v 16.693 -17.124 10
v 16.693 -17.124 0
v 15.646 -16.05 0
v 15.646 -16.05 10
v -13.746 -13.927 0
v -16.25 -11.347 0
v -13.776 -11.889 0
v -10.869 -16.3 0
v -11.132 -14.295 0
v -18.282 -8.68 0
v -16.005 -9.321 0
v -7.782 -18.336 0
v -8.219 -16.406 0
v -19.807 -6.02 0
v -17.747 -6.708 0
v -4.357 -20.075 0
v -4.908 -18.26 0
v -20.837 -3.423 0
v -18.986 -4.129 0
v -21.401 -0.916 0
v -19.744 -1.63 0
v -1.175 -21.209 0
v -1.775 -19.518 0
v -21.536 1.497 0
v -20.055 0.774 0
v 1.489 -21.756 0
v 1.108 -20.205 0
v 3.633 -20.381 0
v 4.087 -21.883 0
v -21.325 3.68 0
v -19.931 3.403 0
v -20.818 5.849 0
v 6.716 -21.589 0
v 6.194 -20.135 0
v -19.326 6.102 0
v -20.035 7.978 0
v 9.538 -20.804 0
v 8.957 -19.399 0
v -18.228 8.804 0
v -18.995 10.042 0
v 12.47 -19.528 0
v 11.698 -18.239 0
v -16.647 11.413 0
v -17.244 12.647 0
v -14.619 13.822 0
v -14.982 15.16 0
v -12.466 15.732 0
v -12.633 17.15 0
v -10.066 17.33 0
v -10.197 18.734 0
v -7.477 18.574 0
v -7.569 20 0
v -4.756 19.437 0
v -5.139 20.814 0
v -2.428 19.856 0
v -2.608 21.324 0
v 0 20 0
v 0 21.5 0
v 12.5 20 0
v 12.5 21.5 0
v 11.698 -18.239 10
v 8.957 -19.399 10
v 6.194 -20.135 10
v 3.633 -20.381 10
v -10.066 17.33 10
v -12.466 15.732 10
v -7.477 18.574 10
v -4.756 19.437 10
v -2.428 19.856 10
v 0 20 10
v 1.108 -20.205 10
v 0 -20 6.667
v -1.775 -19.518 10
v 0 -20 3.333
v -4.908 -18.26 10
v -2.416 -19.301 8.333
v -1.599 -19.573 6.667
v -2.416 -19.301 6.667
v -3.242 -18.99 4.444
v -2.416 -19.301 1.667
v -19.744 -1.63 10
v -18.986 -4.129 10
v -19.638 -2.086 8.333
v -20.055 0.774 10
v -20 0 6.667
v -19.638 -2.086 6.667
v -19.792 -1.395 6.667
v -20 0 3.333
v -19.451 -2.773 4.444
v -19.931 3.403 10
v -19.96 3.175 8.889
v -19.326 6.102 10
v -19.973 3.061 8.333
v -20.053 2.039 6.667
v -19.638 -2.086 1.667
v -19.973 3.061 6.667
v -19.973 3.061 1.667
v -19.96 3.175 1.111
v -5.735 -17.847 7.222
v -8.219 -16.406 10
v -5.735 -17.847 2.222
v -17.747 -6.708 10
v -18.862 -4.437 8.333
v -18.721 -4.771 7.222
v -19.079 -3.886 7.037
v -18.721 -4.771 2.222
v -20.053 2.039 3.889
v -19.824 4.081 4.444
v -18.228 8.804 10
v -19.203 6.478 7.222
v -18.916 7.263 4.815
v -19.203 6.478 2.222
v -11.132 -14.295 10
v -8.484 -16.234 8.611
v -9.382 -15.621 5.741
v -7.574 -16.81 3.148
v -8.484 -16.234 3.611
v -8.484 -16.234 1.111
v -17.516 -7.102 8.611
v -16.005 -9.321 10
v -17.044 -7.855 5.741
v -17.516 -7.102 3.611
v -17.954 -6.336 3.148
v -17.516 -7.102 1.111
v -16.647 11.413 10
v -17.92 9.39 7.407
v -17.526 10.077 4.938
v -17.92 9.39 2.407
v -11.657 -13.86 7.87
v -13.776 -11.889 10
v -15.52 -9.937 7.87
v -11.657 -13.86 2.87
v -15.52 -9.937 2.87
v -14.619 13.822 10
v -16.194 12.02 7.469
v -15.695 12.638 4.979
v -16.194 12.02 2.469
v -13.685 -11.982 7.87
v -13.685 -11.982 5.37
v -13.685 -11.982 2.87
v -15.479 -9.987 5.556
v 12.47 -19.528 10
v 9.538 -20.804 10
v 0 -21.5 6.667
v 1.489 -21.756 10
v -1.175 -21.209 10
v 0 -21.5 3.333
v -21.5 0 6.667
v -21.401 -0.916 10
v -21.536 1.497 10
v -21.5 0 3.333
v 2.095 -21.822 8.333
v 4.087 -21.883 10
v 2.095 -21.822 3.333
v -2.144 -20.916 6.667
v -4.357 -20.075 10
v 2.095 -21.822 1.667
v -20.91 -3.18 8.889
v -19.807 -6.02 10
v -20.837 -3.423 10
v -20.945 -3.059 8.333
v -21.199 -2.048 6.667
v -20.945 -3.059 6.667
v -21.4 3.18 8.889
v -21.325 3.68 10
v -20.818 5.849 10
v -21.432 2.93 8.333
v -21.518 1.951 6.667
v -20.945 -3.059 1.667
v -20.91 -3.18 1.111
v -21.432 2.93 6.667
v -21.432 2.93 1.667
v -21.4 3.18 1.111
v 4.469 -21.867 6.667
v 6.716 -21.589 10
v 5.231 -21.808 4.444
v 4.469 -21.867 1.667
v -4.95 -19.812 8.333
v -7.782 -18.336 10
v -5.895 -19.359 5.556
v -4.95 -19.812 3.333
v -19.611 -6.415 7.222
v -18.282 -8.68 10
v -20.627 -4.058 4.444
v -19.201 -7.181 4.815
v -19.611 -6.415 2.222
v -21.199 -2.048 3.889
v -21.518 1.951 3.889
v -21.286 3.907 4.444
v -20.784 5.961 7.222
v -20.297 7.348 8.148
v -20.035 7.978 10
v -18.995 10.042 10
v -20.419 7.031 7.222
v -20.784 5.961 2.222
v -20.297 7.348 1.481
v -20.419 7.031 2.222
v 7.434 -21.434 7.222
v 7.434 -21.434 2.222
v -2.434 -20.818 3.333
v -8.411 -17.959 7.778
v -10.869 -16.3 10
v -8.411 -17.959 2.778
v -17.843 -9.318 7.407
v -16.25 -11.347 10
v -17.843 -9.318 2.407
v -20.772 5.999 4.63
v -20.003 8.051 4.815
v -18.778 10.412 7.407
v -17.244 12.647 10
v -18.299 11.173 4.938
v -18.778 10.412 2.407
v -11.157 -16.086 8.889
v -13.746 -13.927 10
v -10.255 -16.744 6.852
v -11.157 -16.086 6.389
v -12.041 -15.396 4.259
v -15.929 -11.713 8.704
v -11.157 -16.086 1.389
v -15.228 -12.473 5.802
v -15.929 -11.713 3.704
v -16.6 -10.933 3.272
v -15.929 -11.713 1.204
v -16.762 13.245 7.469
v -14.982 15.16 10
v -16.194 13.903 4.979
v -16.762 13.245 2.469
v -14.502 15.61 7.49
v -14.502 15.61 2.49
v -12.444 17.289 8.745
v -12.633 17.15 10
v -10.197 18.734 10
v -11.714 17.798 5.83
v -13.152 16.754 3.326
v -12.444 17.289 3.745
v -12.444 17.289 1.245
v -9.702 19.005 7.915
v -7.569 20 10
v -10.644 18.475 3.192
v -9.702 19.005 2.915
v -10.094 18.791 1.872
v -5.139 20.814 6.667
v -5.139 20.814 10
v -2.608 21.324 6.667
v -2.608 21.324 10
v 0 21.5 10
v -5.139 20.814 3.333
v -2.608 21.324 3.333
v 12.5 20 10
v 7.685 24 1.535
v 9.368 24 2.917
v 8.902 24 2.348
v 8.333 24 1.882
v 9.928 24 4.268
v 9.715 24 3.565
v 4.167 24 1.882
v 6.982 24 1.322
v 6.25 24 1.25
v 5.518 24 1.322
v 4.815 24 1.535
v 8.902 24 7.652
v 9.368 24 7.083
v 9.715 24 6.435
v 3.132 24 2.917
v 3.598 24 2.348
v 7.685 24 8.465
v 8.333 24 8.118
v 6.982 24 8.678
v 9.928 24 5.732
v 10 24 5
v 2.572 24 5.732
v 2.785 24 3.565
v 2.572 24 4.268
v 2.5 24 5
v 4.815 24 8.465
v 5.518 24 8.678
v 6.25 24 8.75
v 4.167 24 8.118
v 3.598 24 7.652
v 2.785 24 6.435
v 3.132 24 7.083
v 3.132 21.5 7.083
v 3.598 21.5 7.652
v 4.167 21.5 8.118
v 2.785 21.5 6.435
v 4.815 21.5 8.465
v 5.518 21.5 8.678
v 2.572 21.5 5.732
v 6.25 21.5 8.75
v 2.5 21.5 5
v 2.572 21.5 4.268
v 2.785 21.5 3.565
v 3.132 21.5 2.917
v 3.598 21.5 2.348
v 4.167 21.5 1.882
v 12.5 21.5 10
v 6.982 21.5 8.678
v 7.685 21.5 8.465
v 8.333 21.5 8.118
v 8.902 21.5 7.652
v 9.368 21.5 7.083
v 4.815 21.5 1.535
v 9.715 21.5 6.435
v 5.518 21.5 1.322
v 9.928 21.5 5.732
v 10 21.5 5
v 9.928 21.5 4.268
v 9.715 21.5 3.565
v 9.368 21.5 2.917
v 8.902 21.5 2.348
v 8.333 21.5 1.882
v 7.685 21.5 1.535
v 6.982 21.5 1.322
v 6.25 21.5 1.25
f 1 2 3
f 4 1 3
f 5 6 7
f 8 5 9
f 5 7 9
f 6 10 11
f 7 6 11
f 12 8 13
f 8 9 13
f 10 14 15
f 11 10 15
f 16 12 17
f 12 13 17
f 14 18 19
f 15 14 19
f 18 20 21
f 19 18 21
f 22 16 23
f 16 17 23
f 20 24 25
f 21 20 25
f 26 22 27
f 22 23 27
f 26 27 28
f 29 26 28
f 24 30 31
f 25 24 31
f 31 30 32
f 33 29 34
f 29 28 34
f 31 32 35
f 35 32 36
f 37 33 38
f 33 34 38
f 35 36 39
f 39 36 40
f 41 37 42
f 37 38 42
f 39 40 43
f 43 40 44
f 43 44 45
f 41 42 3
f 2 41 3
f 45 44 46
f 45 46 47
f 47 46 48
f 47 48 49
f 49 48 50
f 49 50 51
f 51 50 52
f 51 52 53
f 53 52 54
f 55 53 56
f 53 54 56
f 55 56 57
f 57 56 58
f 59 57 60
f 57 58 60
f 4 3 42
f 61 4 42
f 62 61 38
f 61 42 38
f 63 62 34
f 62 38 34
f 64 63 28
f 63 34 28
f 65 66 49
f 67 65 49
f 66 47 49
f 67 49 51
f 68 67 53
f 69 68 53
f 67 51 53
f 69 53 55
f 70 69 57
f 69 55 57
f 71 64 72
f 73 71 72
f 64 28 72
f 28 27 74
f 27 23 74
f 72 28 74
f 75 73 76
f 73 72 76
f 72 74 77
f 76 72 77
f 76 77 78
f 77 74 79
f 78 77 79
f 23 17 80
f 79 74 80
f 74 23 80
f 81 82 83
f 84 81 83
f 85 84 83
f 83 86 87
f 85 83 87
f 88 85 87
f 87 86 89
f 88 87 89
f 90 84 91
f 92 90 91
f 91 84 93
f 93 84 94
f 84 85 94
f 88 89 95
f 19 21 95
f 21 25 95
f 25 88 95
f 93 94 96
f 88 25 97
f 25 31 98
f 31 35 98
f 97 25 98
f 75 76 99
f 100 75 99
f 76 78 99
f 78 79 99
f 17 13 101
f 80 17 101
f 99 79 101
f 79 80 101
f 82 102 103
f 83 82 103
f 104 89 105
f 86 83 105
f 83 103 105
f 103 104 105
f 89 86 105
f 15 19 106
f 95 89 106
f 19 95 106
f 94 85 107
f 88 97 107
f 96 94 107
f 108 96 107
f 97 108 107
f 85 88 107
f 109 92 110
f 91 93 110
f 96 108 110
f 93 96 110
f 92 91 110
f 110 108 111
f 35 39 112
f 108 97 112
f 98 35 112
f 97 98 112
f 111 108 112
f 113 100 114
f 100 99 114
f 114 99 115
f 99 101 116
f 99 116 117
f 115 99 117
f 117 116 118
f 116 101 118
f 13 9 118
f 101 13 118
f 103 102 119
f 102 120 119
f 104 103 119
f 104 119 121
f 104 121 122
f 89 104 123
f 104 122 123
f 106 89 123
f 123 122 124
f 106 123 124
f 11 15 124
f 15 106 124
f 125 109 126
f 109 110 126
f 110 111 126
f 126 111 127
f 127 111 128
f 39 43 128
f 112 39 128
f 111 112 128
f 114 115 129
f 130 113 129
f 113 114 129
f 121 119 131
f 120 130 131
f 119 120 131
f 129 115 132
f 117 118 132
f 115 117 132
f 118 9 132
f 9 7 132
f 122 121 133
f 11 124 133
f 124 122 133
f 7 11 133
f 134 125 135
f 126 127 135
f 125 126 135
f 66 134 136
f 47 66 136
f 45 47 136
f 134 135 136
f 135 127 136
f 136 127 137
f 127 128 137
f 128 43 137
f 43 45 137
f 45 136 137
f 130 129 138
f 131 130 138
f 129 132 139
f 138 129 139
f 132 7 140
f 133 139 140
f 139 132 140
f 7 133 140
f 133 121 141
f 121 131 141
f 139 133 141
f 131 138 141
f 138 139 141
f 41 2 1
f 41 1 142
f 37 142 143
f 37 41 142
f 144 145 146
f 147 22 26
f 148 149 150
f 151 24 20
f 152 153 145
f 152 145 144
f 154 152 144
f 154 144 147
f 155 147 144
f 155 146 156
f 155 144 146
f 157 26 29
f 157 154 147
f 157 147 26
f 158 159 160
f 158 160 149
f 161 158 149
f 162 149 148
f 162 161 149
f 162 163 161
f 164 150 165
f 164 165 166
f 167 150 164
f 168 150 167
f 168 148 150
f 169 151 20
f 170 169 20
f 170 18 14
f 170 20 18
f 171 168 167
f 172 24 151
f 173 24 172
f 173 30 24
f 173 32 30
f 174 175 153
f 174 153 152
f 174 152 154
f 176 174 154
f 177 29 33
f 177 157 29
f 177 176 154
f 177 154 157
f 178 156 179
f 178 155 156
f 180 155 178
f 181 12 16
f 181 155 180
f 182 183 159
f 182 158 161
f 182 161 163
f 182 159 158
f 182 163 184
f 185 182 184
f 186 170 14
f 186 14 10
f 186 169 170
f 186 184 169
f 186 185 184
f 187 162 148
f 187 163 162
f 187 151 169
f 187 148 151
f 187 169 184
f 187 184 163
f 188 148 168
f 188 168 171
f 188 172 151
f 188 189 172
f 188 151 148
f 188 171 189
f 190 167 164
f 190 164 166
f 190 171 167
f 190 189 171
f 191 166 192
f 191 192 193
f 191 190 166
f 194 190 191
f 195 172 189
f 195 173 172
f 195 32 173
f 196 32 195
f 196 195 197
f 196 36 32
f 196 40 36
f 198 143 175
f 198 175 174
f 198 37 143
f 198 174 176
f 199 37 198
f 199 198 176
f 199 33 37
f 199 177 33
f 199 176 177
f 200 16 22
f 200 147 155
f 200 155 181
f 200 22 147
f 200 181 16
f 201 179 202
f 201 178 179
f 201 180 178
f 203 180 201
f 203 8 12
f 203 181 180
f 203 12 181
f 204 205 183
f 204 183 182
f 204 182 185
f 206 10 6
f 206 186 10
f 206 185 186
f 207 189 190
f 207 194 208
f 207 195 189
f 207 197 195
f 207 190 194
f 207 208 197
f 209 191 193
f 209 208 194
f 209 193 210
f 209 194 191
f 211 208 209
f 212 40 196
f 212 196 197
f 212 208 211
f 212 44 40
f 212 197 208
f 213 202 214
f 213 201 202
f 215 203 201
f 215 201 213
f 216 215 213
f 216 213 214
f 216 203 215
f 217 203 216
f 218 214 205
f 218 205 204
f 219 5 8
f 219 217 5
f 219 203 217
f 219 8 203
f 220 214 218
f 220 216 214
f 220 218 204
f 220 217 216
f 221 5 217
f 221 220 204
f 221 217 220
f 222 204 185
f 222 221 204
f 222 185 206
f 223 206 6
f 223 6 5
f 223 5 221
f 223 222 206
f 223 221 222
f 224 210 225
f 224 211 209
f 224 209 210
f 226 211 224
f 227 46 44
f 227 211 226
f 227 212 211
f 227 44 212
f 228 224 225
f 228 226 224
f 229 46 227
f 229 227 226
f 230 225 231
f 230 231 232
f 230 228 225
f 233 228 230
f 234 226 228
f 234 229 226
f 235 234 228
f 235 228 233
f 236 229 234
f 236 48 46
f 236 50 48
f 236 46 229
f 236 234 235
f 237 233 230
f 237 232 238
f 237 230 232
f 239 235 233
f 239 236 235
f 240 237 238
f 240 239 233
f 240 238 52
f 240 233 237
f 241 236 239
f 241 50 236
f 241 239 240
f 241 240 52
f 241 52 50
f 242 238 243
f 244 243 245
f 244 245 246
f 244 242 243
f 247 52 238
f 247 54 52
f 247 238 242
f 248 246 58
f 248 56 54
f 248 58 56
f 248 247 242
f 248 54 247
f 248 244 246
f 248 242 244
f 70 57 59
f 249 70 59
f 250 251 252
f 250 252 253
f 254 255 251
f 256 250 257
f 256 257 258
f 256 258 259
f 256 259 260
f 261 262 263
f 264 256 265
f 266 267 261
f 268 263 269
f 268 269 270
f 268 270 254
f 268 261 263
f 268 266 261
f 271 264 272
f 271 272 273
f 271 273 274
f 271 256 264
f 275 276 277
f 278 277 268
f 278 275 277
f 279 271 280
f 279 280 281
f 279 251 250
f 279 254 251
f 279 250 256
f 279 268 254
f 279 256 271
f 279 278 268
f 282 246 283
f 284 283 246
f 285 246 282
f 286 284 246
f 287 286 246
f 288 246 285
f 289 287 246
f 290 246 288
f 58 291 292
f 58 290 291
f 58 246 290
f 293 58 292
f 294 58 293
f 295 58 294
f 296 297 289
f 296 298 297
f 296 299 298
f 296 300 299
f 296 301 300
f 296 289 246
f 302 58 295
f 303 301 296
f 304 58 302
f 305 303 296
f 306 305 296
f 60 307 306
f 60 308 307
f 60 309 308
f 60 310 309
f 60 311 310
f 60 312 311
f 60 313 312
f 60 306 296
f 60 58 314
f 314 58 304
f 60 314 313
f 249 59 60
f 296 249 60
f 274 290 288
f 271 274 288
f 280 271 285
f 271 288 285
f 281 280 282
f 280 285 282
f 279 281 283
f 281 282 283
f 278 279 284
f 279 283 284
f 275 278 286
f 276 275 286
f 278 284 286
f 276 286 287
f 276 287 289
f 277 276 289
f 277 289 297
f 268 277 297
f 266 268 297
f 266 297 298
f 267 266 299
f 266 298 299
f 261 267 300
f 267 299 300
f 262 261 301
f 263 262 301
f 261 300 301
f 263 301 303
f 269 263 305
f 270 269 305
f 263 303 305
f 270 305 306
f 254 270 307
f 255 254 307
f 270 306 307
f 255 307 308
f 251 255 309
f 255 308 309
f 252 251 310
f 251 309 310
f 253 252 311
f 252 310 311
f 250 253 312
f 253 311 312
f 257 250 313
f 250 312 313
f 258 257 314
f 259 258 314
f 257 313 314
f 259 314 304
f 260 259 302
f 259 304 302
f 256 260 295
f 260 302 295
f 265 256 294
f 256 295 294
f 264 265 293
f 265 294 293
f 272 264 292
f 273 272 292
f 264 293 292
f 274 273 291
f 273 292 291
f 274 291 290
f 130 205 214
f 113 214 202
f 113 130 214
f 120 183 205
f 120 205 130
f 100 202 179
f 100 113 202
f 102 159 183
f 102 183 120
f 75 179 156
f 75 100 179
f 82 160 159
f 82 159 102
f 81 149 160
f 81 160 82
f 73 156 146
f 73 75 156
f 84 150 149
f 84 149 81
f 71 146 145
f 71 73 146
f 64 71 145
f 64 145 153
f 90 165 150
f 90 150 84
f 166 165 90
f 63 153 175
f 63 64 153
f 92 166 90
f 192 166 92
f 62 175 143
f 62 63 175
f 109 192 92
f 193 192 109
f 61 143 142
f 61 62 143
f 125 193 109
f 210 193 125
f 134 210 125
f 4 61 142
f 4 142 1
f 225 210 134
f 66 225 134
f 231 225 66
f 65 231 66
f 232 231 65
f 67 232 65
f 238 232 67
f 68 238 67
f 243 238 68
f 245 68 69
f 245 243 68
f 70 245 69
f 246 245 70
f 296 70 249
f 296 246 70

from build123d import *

# Parameters (mm, degrees)
F0_W     = 12.5
F0_H     = 1.5
F1_DEPTH = 10
F2_R     = 3.75
F3_DEPTH = 2.5


with BuildPart() as f1:
    # F0 (on Top) → F1 (new body)
    with BuildSketch(Plane.XY):
        with BuildLine():
            Line((16.693130733, -17.1243181497), (15.6460795552, -16.0502213985))
            add(Edge.make_bspline(
                [(15.6460795552, -16.0502213985), (10.9723080383, -18.8382862325), (-0.065053846, -24.716642573), (-29.8807188342, -0.9054199431), (-12, 20), (0, 20)],
                knots=[0, 0, 0, 0, 0.2741347036, 0.6370673518, 1, 1, 1, 1], degree=3))
            Line((0, 20), (-7.5694808965, 20))
            add(Edge.make_bspline(
                [(16.693130733, -17.1243181497), (11.7150097642, -20.1692427359), (0.0303697623, -26.6122584875), (-29.9535860826, -3.0039292772), (-15.9868170366, 16.6070562714), (-7.5694808965, 20)],
                knots=[0, 0, 0, 0, 0.2736168492, 0.6368084246, 0.9201107646, 0.9201107646, 0.9201107646, 0.9201107646], degree=3))
        make_face()
        with BuildLine():
            Line((-7.5694808965, 20), (0, 20))
            Line((0, 20), (0, 21.5))
            add(Edge.make_bspline(
                [(-7.5694808965, 20), (-5.1958522543, 20.9567858859), (-2.6395734099, 21.5), (0, 21.5)],
                knots=[0.9201107646, 0.9201107646, 0.9201107646, 0.9201107646, 1, 1, 1, 1], degree=3))
        make_face()
        with Locations((6.25, 20.75)):
            Rectangle(F0_W, F0_H)
    extrude(amount=F1_DEPTH)

    # F2 (on face) → F3 (join)
    with BuildSketch(Plane(origin=(0, 21.5, 0), x_dir=(-1, 0, 0), z_dir=(0, 1, 0))):
        with Locations((-6.25, 5)):
            Circle(F2_R)
    extrude(amount=F3_DEPTH)


solid = f1.part
